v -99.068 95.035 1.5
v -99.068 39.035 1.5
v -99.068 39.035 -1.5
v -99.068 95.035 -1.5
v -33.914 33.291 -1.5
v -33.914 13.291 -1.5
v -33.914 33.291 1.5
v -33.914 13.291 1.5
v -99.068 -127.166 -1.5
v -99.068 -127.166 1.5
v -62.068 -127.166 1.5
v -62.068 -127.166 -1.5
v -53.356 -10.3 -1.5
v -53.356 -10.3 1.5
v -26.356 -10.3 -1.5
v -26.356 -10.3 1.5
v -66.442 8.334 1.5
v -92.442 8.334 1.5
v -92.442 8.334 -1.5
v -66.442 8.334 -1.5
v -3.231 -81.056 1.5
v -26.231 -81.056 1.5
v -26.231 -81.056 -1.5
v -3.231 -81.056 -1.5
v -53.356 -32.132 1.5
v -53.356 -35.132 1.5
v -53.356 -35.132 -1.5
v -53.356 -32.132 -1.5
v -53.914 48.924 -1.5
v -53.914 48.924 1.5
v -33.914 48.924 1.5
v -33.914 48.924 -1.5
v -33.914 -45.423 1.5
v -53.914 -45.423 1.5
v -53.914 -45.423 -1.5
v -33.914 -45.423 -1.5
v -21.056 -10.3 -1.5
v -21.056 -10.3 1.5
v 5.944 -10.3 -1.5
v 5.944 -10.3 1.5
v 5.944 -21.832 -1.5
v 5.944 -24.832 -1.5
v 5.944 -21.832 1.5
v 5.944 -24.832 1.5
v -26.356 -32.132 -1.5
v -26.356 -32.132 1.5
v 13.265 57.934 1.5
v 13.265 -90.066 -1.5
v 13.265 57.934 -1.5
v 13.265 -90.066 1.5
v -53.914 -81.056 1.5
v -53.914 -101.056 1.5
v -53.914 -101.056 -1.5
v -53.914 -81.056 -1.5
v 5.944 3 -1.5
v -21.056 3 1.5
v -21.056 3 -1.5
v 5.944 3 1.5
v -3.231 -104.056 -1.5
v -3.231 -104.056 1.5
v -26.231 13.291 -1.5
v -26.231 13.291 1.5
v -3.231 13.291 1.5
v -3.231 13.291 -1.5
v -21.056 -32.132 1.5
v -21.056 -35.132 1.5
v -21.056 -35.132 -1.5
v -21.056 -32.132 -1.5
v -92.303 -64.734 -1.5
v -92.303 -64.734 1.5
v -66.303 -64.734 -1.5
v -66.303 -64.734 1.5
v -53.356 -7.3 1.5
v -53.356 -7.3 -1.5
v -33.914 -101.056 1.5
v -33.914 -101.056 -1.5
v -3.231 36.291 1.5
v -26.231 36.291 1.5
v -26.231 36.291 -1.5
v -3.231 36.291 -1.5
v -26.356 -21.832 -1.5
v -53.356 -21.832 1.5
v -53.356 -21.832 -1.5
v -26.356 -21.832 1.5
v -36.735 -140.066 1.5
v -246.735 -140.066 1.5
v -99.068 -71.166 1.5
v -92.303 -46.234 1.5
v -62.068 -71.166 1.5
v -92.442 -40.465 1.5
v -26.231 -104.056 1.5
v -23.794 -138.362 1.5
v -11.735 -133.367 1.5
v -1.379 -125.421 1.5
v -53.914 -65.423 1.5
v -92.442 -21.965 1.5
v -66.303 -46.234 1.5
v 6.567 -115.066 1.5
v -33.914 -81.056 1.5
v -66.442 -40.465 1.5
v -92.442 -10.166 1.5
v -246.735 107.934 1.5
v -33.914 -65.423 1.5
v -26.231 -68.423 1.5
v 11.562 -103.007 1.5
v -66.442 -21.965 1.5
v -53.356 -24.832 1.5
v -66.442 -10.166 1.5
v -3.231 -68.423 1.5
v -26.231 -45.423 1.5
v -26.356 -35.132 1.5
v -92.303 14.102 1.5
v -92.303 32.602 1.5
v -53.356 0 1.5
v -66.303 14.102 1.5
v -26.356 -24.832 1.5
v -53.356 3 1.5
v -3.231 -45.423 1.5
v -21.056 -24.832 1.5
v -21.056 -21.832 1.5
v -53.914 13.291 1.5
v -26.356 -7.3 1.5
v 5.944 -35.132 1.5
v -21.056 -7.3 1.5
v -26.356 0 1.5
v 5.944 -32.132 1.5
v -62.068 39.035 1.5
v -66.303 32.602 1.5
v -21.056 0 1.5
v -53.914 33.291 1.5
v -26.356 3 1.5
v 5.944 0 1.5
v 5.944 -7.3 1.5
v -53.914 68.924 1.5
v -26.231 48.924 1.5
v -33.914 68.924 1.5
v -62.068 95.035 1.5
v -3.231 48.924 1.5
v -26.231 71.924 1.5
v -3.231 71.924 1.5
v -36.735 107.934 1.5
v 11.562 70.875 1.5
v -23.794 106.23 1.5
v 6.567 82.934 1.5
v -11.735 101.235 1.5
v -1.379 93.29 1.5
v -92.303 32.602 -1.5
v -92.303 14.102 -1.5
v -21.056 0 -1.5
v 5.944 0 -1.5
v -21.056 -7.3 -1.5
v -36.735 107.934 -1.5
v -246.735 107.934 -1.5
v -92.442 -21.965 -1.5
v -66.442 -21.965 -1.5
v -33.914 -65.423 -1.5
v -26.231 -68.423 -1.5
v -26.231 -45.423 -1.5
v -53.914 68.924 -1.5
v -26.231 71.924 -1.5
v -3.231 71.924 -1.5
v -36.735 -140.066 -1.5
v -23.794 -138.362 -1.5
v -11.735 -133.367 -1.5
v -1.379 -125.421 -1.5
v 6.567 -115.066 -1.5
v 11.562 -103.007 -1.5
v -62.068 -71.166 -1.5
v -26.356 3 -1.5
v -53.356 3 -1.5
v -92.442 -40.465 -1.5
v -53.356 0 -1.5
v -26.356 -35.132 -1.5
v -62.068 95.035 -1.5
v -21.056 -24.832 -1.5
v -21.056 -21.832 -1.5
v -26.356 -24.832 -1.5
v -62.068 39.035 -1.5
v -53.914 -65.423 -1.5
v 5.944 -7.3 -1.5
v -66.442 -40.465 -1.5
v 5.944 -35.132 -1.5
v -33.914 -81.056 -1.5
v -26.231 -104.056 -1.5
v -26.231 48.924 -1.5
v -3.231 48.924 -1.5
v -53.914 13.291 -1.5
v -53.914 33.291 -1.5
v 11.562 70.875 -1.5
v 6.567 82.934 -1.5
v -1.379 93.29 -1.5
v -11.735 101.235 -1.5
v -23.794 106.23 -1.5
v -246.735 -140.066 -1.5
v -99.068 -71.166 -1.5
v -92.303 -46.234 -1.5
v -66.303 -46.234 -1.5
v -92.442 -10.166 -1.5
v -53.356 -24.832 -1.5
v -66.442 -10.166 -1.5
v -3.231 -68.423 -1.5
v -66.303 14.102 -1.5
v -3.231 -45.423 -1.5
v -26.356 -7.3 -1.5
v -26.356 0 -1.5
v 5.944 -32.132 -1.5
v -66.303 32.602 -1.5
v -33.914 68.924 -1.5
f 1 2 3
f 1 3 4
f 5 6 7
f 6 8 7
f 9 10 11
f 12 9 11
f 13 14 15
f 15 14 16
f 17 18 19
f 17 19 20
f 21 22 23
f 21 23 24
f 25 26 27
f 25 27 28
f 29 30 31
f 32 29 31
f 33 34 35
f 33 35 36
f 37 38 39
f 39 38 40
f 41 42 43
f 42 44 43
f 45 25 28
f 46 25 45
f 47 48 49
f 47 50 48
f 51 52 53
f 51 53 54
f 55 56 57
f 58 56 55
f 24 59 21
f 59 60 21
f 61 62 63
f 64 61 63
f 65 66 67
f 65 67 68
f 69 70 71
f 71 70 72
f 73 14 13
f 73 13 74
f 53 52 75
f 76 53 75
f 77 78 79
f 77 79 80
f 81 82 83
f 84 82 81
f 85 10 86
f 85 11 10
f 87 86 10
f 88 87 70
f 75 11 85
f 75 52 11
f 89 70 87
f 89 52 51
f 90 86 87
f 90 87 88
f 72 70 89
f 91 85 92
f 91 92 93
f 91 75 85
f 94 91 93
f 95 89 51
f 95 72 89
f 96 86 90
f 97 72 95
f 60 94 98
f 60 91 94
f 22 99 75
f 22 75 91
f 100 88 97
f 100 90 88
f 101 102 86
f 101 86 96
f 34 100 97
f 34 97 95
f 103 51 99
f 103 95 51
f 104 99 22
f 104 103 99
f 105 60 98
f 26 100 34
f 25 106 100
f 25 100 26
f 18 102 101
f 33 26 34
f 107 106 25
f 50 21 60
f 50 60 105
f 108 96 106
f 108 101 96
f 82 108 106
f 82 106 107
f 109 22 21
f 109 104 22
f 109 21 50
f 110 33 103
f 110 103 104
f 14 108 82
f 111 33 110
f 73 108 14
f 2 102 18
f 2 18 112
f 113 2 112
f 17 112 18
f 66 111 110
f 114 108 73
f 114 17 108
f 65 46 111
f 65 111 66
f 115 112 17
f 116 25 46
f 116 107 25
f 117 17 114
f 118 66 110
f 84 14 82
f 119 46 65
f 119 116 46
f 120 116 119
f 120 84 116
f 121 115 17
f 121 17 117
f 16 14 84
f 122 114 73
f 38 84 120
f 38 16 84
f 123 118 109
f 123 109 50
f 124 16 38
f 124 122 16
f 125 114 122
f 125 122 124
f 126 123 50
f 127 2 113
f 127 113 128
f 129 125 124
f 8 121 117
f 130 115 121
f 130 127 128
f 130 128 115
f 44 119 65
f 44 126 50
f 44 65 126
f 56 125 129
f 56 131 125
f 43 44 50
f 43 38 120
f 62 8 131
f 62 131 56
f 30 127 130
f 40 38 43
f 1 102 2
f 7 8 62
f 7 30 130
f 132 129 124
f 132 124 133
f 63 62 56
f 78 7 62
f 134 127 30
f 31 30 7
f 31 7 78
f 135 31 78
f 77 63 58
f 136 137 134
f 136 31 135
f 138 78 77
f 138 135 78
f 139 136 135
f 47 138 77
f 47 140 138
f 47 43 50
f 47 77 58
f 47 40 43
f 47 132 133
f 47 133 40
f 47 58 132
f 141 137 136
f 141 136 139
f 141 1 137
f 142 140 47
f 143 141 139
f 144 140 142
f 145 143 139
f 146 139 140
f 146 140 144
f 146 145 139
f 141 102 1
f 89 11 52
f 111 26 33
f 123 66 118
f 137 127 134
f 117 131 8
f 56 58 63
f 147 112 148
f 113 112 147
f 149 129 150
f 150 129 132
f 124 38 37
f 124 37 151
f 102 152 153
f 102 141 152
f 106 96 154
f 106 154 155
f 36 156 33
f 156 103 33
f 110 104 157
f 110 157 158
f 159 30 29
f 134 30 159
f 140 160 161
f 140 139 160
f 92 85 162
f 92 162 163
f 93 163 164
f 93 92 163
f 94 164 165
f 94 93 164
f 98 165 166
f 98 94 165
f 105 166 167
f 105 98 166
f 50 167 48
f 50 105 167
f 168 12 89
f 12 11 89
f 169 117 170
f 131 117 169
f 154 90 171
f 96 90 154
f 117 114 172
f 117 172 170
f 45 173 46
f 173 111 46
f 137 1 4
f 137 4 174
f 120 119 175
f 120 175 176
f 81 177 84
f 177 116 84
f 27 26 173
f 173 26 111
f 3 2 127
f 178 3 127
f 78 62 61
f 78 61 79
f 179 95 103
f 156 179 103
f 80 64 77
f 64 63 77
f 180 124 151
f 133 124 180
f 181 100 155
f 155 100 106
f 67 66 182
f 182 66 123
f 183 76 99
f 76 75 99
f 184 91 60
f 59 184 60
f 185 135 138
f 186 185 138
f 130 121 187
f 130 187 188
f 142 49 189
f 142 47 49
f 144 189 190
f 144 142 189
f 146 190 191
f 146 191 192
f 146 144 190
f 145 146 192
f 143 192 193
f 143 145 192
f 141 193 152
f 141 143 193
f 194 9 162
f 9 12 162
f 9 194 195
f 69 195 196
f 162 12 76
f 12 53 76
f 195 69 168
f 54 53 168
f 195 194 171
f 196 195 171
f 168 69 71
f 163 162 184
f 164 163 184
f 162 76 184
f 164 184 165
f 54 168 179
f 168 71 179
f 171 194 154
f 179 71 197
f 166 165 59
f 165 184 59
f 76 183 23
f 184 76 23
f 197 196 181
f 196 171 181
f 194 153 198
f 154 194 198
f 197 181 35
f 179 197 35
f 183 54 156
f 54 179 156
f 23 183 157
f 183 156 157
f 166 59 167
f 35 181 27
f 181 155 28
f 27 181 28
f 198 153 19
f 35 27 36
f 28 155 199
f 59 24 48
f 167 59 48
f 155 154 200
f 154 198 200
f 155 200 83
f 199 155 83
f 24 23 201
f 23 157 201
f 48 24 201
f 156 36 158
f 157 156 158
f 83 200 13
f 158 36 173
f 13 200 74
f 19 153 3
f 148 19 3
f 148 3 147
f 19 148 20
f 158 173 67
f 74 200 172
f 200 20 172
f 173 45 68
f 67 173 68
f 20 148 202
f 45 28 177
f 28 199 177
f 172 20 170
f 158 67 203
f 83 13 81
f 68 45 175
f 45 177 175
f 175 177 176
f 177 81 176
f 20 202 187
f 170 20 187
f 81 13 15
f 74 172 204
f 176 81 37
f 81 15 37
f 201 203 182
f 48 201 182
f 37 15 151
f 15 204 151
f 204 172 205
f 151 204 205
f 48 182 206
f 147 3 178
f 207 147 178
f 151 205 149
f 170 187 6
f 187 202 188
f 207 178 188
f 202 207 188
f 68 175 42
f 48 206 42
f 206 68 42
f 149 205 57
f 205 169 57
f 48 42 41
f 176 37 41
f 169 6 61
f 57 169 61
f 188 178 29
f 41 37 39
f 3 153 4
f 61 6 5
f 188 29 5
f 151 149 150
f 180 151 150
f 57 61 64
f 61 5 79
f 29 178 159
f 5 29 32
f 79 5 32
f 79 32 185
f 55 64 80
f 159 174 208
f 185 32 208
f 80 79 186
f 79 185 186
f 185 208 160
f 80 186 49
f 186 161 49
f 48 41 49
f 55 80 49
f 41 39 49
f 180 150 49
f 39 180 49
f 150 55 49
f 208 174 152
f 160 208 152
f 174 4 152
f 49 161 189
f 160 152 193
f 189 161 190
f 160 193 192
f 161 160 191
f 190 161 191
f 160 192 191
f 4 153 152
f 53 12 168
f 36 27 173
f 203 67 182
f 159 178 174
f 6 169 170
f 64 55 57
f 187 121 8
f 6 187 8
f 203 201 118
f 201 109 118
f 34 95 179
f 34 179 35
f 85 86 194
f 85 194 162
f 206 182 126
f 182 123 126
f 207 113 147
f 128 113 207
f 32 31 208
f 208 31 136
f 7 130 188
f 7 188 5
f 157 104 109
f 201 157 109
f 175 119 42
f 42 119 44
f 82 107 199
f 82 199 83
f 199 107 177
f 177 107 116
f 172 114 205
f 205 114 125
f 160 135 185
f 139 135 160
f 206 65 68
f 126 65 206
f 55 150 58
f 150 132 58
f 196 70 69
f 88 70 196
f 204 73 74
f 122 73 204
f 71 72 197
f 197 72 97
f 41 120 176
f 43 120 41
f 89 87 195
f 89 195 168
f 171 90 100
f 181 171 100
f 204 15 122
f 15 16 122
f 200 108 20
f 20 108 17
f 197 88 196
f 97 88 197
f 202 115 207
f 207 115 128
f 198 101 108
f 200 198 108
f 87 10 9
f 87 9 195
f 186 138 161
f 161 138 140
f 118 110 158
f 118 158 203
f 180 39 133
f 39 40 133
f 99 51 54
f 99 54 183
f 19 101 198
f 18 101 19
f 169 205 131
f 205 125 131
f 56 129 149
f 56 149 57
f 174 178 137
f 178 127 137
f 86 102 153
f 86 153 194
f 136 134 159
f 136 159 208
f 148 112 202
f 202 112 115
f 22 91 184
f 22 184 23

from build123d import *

# Parameters (mm, degrees)
F0_W     = 37
F0_H     = 56
F0_W_2   = 20
F0_H_2   = 20
F0_W_3   = 23
F0_H_3   = 23
F0_W_4   = 26
F0_H_4   = 18.5
F0_W_5   = 27
F0_H_5   = 3
F1_DEPTH = 1.5


with BuildPart() as f1:
    # F0 (on Top) → F1 (new body, symmetric)
    with BuildSketch(Plane.XY):
        with BuildLine():
            Line((-36.7347033552, 107.9341696352), (-246.7347033552, 107.9341696352))
            Line((-246.7347033552, 107.9341696352), (-246.7347033552, -140.0658303648))
            Line((-246.7347033552, -140.0658303648), (-36.7347033552, -140.0658303648))
            ThreePointArc((-36.7347033552, -140.0658303648), (-1.3793642959, -125.4211694242), (13.2652966448, -90.0658303648))
            Line((13.2652966448, -90.0658303648), (13.2652966448, 57.9341696352))
            ThreePointArc((13.2652966448, 57.9341696352), (-1.3793642959, 93.2895086945), (-36.7347033552, 107.9341696352))
        make_face()
        with Locations((-80.5683995187, -99.1663551629)):
            Rectangle(F0_W, F0_H, mode=Mode.SUBTRACT)
        with Locations((-43.9143308997, -91.0555796049)):
            Rectangle(F0_W_2, F0_H_2, mode=Mode.SUBTRACT)
        with Locations((-14.7307934463, -92.5555796049)):
            Rectangle(F0_W_3, F0_H_3, mode=Mode.SUBTRACT)
        with Locations((-79.3031121492, -55.4835397024)):
            Rectangle(F0_W_4, F0_H_4, mode=Mode.SUBTRACT)
        with Locations((-79.4423933029, -31.2153330278)):
            Rectangle(F0_W_4, F0_H_4, mode=Mode.SUBTRACT)
        with Locations((-43.9143308997, -55.4228818417)):
            Rectangle(F0_W_2, F0_H_2, mode=Mode.SUBTRACT)
        with Locations((-14.7307934463, -56.9228818417)):
            Rectangle(F0_W_3, F0_H_3, mode=Mode.SUBTRACT)
        with Locations((-39.8564947546, -33.6316607296)):
            Rectangle(F0_W_5, F0_H_5, mode=Mode.SUBTRACT)
        with Locations((-39.8564947546, -23.3316607296)):
            Rectangle(F0_W_5, F0_H_5, mode=Mode.SUBTRACT)
        with Locations((-7.5564947546, -33.6316607296)):
            Rectangle(F0_W_5, F0_H_5, mode=Mode.SUBTRACT)
        with Locations((-7.5564947546, -23.3316607296)):
            Rectangle(F0_W_5, F0_H_5, mode=Mode.SUBTRACT)
        with Locations((-79.4423933029, -0.9163277019)):
            Rectangle(F0_W_4, F0_H_4, mode=Mode.SUBTRACT)
        with Locations((-79.3031121492, 23.3518789727)):
            Rectangle(F0_W_4, F0_H_4, mode=Mode.SUBTRACT)
        with Locations((-39.8564947546, -8.8)):
            Rectangle(F0_W_5, F0_H_5, mode=Mode.SUBTRACT)
        with Locations((-39.8564947546, 1.5)):
            Rectangle(F0_W_5, F0_H_5, mode=Mode.SUBTRACT)
        with Locations((-7.5564947546, -8.8)):
            Rectangle(F0_W_5, F0_H_5, mode=Mode.SUBTRACT)
        with Locations((-7.5564947546, 1.5)):
            Rectangle(F0_W_5, F0_H_5, mode=Mode.SUBTRACT)
        with Locations((-43.9143308997, 23.291221112)):
            Rectangle(F0_W_2, F0_H_2, mode=Mode.SUBTRACT)
        with Locations((-14.7307934463, 24.791221112)):
            Rectangle(F0_W_3, F0_H_3, mode=Mode.SUBTRACT)
        with Locations((-80.5683995187, 67.0346944332)):
            Rectangle(F0_W, F0_H, mode=Mode.SUBTRACT)
        with Locations((-43.9143308997, 58.9239188753)):
            Rectangle(F0_W_2, F0_H_2, mode=Mode.SUBTRACT)
        with Locations((-14.7307934463, 60.4239188753)):
            Rectangle(F0_W_3, F0_H_3, mode=Mode.SUBTRACT)
    extrude(amount=F1_DEPTH, both=True)


solid = f1.part
